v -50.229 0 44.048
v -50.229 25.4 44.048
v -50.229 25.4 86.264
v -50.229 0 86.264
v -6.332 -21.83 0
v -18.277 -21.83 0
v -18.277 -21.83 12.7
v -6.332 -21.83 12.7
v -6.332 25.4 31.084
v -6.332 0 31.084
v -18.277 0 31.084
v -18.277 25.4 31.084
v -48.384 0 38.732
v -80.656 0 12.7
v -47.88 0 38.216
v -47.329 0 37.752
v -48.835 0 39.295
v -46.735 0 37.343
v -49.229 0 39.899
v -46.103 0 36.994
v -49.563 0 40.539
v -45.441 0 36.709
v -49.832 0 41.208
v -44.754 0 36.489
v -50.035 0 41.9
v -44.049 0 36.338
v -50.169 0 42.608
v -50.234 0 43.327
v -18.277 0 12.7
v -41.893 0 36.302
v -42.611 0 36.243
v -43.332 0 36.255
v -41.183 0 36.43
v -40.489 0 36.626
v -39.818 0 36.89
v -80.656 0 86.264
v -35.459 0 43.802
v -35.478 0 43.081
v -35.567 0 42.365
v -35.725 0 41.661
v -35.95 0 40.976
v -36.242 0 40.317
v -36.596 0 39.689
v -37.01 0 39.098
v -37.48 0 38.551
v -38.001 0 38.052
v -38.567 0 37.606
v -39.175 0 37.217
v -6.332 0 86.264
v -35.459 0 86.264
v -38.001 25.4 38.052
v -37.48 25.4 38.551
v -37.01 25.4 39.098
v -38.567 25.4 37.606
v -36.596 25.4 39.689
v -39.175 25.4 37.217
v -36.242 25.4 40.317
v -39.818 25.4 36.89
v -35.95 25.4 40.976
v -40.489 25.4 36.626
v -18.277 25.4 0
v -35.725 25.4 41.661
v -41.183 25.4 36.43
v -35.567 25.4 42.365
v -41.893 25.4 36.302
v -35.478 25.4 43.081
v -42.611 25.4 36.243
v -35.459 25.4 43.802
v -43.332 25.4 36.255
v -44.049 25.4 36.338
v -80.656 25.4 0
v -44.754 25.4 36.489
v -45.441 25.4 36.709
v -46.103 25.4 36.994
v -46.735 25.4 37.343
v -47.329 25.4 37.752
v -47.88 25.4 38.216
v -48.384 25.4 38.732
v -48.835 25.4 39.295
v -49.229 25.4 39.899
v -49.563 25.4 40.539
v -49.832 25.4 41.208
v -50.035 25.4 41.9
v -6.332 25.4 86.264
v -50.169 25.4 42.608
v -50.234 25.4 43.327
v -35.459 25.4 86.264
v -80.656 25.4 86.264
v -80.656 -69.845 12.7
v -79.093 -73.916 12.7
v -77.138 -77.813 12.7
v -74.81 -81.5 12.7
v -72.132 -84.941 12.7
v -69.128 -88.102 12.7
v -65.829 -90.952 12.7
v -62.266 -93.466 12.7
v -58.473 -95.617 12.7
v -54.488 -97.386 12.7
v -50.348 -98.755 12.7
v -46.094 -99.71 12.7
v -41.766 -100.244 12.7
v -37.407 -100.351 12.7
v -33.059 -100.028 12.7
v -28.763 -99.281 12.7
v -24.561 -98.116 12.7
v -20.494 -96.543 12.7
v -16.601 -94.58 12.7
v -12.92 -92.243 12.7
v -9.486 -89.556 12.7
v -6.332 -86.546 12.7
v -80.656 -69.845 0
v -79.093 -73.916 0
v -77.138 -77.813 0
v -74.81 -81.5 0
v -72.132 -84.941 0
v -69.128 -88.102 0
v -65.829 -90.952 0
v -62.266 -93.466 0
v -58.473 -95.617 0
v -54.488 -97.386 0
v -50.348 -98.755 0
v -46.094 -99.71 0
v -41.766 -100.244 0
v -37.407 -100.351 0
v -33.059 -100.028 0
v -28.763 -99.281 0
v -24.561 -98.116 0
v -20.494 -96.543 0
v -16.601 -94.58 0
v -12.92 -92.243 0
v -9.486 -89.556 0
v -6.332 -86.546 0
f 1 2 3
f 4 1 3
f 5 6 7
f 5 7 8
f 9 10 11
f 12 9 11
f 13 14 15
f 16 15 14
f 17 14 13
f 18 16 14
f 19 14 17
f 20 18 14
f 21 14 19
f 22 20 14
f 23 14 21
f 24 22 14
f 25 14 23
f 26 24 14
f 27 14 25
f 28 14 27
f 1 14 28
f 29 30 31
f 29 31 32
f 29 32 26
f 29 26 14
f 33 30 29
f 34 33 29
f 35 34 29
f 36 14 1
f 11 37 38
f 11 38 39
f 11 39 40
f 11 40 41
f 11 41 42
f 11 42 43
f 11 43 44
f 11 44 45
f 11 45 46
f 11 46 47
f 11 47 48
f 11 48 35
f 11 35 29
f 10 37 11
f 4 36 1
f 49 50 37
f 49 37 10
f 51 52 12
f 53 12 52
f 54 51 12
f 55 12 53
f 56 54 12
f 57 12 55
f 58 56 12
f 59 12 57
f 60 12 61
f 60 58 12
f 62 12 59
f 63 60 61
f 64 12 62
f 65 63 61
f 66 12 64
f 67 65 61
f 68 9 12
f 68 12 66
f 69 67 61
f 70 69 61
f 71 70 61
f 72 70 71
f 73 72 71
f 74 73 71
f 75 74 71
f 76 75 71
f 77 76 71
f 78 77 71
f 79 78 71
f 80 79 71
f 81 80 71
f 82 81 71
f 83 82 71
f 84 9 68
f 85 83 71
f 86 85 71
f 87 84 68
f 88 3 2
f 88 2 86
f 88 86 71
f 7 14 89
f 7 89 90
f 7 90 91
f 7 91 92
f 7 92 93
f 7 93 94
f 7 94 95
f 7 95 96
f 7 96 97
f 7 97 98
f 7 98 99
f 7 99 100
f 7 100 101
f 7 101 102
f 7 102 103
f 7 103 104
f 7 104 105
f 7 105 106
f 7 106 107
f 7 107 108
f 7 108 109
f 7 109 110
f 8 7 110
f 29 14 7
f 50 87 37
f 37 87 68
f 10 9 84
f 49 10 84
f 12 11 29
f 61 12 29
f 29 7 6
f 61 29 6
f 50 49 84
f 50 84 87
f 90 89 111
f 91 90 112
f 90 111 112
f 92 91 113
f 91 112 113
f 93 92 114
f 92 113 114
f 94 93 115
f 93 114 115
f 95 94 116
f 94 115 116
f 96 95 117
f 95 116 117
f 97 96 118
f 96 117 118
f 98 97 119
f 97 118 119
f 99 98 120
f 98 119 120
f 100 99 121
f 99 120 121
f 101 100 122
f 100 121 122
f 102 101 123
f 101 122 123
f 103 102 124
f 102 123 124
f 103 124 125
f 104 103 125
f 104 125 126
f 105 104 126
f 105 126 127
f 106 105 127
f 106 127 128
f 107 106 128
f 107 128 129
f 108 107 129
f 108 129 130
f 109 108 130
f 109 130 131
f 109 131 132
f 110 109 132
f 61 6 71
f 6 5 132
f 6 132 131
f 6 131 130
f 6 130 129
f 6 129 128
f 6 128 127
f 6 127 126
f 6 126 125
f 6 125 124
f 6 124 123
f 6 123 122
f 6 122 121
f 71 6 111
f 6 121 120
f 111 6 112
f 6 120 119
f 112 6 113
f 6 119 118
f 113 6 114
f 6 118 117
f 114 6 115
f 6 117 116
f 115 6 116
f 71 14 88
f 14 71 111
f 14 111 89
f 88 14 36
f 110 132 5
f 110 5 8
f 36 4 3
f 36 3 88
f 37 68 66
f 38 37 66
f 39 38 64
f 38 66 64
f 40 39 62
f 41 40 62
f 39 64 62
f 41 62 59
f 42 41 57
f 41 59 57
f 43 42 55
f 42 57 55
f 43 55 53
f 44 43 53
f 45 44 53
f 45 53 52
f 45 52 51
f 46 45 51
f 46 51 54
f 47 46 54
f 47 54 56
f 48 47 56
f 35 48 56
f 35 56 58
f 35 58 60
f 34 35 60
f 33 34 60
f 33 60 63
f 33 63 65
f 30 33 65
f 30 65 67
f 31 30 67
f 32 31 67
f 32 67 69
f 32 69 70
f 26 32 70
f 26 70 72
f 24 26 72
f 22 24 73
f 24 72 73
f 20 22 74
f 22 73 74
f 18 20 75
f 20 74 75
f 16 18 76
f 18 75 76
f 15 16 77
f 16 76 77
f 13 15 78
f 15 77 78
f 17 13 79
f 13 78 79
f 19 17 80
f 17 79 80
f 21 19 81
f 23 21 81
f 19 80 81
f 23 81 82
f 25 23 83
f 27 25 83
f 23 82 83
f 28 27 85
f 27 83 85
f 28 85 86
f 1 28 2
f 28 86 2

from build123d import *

# Parameters (mm, degrees)
F0_W      = 85.8696545474
F0_H      = 63.5460242629
F1_DEPTH  = 12.7
F2_W      = 92.7285123616
F2_H      = 86.2638354301
F3_DEPTH  = 25.4
F4_W      = 18.4039166197
F4_H      = 86.2638354301
F5_DEPTH  = 125.7651254213
F7_DEPTH  = 125.7651254213
F8_W      = 11.9450474158
F8_H      = 21.8296758831
F9_DEPTH  = 12.701
F11_DEPTH = 25.401


with BuildPart() as f1:
    # F0 (on Top) → F1 (new body)
    with BuildSketch(Plane.XY):
        with BuildLine():
            Line((-80.6561261415, -63.5460242629), (-80.6561261415, -69.8450654745))
            ThreePointArc((-80.6561261415, -69.8450654745), (-35.2602329122, -100.2452354213), (5.2135284059, -63.5460242629))
            Line((5.2135284059, -63.5460242629), (-80.6561261415, -63.5460242629))
        make_face()
        with Locations((-37.7212988678, -31.7730121315)):
            Rectangle(F0_W, F0_H)
    extrude(amount=F1_DEPTH)

    # F2 (on face) → F3 (join)
    with BuildSketch(Plane(origin=(0, 0, 0), x_dir=(-1, 0, 0), z_dir=(0, 1, 0))):
        with Locations((34.2918699607, 43.1319177151)):
            Rectangle(F2_W, F2_H)
    extrude(amount=F3_DEPTH)

    # F4 (on face) → F5 (cut, through all)
    with BuildSketch(Plane(origin=(0, 25.4, 0), x_dir=(-1, 0, 0), z_dir=(0, 1, 0))):
        with Locations((-2.8704279102, 43.1319177151)):
            Rectangle(F4_W, F4_H)
    extrude(amount=-F5_DEPTH, mode=Mode.SUBTRACT)

    # F6 (on face) → F7 (cut, through all)
    with BuildSketch(Plane(origin=(0, 25.4, 0), x_dir=(-1, 0, 0), z_dir=(0, 1, 0))):
        with BuildLine():
            Line((35.4592986405, 86.2638354301), (35.4592986405, 43.8016988337))
            ThreePointArc((35.4592986405, 43.8016988337), (42.9720902866, 36.2405068141), (50.22874102, 44.0478548408))
            Line((50.22874102, 44.0478548408), (49.4902729988, 86.2638354301))
            Line((49.4902729988, 86.2638354301), (35.4592986405, 86.2638354301))
        make_face()
        Polygon((49.4902729988, 86.2638354301), (50.22874102, 44.0478548408), (50.22874102, 86.2638354301), align=None)
    extrude(amount=-F7_DEPTH, mode=Mode.SUBTRACT)

    # F8 (on face) → F9 (cut, through all)
    with BuildSketch(Plane.XY.offset(12.7)):
        with Locations((-12.3040541075, -10.9148379415)):
            Rectangle(F8_W, F8_H)
    extrude(amount=-F9_DEPTH, mode=Mode.SUBTRACT)

    # F10 (on face) → F11 (cut, through all)
    with BuildSketch(Plane.XZ):
        Polygon((-18.2765778154, 31.0841165483), (-18.2765778154, 12.7), (-18.2765778154, 0), (-6.3315303996, 0), (-6.3315303996, 31.0841165483), align=None)
    extrude(amount=-F11_DEPTH, mode=Mode.SUBTRACT)


solid = f1.part
